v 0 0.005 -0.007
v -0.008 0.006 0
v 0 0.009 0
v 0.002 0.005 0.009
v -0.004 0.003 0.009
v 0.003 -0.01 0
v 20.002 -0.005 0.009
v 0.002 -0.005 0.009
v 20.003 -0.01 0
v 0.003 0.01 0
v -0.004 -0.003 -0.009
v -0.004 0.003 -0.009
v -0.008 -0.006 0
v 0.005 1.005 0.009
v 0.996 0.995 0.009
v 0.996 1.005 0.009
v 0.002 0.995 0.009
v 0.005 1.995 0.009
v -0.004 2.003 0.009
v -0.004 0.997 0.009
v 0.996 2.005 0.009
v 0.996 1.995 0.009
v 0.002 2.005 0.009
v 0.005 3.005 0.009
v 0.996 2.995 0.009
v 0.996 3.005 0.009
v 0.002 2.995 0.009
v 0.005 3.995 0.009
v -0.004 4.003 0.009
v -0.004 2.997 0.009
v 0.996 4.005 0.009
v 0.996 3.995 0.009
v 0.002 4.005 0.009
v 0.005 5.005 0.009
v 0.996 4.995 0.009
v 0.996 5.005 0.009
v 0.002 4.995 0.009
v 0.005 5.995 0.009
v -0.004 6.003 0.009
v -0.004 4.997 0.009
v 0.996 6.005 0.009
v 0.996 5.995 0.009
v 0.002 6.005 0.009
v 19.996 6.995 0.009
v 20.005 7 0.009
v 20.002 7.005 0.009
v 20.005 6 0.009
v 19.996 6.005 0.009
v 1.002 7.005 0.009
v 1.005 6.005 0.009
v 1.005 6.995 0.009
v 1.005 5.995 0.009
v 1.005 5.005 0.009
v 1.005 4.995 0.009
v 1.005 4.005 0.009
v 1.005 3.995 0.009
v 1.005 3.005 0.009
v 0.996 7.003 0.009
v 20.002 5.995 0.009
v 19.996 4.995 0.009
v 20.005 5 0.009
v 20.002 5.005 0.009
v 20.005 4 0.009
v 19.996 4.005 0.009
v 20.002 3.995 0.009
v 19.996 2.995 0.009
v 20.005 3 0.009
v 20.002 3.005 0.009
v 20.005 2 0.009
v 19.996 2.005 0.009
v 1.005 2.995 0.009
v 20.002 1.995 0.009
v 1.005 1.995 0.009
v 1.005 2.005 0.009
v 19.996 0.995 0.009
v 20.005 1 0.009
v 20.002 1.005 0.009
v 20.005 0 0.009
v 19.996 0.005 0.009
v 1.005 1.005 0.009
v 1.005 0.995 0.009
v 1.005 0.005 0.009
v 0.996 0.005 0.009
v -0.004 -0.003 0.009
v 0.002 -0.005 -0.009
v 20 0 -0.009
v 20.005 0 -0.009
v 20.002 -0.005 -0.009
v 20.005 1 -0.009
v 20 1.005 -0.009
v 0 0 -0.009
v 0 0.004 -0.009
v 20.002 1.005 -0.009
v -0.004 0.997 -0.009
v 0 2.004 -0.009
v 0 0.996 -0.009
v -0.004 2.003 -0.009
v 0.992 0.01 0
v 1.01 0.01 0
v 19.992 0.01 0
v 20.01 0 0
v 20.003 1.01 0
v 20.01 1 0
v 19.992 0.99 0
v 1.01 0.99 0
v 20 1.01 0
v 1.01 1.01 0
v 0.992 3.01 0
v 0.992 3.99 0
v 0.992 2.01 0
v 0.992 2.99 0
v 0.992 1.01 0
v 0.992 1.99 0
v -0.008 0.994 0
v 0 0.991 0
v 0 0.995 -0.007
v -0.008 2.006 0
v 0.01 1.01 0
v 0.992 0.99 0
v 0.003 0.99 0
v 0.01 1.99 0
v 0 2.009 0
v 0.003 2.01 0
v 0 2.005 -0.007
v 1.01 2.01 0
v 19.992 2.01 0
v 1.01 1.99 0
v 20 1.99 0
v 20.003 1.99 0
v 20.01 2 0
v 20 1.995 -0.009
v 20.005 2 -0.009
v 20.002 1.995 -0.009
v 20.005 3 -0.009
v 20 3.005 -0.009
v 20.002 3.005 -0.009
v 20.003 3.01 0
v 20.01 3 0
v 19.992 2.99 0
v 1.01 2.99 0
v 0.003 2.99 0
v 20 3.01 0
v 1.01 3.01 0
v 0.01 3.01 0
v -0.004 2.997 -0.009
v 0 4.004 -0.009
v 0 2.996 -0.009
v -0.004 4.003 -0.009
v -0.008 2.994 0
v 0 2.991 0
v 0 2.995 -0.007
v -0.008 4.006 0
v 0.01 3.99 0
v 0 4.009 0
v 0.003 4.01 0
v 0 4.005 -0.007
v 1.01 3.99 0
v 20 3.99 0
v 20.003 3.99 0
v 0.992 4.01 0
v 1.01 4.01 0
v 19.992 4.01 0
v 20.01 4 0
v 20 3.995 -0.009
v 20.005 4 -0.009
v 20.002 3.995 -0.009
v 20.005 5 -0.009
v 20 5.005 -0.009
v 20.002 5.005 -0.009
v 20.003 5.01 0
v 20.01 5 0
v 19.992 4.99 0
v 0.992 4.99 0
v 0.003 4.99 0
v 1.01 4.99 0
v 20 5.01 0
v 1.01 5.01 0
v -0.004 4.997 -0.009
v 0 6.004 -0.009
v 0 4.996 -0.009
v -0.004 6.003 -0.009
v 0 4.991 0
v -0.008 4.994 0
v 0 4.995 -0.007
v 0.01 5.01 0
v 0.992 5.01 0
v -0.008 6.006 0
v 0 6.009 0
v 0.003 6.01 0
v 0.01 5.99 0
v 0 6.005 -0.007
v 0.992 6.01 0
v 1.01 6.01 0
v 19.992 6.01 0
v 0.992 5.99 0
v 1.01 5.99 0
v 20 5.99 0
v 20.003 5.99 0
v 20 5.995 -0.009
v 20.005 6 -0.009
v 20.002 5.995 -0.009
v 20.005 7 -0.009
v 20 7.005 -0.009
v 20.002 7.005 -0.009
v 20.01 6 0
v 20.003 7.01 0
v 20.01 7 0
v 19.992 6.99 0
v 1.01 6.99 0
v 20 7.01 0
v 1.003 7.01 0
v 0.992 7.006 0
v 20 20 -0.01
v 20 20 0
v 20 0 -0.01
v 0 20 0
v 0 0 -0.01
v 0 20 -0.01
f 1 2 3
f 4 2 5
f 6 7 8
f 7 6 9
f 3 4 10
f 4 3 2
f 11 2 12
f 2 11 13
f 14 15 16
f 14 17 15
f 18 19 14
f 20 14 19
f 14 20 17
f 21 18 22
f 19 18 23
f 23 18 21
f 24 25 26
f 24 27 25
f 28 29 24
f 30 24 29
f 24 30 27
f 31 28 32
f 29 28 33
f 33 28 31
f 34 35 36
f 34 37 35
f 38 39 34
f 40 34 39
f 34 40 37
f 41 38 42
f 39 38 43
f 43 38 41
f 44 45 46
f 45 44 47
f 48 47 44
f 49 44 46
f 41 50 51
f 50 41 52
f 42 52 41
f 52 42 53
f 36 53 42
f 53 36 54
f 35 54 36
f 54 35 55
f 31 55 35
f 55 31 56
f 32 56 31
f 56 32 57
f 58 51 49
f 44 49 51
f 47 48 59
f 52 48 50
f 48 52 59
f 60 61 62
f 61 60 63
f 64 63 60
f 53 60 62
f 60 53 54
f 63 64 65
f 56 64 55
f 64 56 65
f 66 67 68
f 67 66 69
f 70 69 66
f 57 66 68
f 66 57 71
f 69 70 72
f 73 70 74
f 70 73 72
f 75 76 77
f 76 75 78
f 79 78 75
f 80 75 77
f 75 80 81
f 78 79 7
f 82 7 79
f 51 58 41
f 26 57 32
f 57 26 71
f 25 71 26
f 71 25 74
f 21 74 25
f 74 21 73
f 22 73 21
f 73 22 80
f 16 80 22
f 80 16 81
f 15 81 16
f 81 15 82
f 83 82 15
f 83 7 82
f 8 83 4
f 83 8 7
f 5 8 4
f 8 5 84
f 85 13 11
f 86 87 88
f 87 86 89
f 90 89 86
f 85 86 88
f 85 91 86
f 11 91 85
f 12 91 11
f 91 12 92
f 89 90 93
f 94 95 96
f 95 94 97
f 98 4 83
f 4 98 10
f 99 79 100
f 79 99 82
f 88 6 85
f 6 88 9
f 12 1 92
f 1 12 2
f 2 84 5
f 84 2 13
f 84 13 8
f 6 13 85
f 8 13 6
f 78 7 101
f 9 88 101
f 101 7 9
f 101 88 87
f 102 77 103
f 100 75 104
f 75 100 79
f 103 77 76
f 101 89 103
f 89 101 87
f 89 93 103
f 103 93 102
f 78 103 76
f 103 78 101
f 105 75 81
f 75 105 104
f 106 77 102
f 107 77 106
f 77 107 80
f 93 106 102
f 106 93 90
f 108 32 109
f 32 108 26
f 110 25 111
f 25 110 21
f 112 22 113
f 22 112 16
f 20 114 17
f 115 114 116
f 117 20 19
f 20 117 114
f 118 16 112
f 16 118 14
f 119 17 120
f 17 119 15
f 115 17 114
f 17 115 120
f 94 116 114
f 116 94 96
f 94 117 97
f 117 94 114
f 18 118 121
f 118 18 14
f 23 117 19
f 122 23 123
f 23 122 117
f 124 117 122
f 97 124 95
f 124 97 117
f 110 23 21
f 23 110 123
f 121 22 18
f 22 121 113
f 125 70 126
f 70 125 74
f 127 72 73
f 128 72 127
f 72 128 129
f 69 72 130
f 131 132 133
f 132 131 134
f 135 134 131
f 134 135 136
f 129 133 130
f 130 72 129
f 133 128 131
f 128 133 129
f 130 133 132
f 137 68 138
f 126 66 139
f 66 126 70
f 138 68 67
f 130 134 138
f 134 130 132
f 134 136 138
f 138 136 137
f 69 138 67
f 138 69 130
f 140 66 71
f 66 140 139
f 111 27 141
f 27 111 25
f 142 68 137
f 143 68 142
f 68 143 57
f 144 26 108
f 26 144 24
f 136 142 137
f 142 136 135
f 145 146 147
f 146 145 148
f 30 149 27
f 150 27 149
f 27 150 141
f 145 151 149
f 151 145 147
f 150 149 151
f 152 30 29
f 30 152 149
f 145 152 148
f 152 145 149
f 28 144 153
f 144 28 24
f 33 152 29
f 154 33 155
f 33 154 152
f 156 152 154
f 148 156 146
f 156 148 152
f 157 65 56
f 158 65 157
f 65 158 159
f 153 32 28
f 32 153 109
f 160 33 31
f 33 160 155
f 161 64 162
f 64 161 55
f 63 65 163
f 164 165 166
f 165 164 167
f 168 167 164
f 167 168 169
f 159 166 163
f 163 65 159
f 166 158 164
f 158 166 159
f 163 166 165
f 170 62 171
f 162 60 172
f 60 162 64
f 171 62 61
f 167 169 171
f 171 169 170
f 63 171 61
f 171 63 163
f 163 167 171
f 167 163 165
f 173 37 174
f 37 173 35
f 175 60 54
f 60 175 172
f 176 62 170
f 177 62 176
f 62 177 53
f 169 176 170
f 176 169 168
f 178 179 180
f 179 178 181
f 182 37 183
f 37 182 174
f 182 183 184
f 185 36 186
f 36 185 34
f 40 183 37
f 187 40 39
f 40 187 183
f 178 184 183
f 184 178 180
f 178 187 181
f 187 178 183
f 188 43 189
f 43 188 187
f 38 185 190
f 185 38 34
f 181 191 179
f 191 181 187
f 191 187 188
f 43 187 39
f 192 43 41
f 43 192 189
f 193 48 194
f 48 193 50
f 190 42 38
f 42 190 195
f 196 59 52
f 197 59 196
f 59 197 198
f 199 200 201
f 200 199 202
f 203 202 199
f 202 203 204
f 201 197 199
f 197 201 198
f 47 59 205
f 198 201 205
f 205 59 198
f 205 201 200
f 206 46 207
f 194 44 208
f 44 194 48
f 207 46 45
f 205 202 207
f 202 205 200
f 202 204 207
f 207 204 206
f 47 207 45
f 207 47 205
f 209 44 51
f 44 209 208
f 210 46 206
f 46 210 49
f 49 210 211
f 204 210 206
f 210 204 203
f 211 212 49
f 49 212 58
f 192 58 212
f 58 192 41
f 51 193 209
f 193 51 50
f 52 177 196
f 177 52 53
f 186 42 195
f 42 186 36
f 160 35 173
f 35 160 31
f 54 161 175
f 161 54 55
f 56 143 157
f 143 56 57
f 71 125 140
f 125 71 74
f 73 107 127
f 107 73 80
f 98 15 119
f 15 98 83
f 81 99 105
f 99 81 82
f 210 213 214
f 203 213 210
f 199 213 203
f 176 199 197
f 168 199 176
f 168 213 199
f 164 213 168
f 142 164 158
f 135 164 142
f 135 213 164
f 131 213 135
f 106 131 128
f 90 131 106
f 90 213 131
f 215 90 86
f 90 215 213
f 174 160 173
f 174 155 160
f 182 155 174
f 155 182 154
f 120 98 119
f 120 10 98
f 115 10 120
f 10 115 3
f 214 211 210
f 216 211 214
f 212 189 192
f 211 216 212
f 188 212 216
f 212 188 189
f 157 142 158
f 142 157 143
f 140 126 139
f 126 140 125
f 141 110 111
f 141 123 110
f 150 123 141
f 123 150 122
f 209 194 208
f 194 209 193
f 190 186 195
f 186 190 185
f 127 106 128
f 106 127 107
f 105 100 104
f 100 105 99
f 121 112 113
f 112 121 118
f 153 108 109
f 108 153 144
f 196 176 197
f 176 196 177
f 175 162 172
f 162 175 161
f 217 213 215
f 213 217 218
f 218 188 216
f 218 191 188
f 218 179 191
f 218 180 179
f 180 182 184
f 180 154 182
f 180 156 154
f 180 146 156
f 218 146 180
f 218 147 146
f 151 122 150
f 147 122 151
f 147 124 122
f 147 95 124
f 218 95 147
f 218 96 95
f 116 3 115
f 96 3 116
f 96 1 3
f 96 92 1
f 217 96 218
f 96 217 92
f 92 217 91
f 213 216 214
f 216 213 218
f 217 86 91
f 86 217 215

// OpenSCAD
hull(){
    translate([0.0, 0.0]) sphere(0.01);
    translate([1.0, 0.0]) sphere(0.01);
}
hull(){
    translate([1.0, 0.0]) sphere(0.01);
    translate([2.0, 0.0]) sphere(0.01);
}
hull(){
    translate([2.0, 0.0]) sphere(0.01);
    translate([3.0, 0.0]) sphere(0.01);
}
hull(){
    translate([3.0, 0.0]) sphere(0.01);
    translate([4.0, 0.0]) sphere(0.01);
}
hull(){
    translate([4.0, 0.0]) sphere(0.01);
    translate([5.0, 0.0]) sphere(0.01);
}
hull(){
    translate([5.0, 0.0]) sphere(0.01);
    translate([6.0, 0.0]) sphere(0.01);
}
hull(){
    translate([6.0, 0.0]) sphere(0.01);
    translate([7.0, 0.0]) sphere(0.01);
}
hull(){
    translate([7.0, 0.0]) sphere(0.01);
    translate([8.0, 0.0]) sphere(0.01);
}
hull(){
    translate([8.0, 0.0]) sphere(0.01);
    translate([9.0, 0.0]) sphere(0.01);
}
hull(){
    translate([9.0, 0.0]) sphere(0.01);
    translate([10.0, 0.0]) sphere(0.01);
}
hull(){
    translate([10.0, 0.0]) sphere(0.01);
    translate([11.0, 0.0]) sphere(0.01);
}
hull(){
    translate([11.0, 0.0]) sphere(0.01);
    translate([12.0, 0.0]) sphere(0.01);
}
hull(){
    translate([12.0, 0.0]) sphere(0.01);
    translate([13.0, 0.0]) sphere(0.01);
}
hull(){
    translate([13.0, 0.0]) sphere(0.01);
    translate([14.0, 0.0]) sphere(0.01);
}
hull(){
    translate([14.0, 0.0]) sphere(0.01);
    translate([15.0, 0.0]) sphere(0.01);
}
hull(){
    translate([15.0, 0.0]) sphere(0.01);
    translate([16.0, 0.0]) sphere(0.01);
}
hull(){
    translate([16.0, 0.0]) sphere(0.01);
    translate([17.0, 0.0]) sphere(0.01);
}
hull(){
    translate([17.0, 0.0]) sphere(0.01);
    translate([18.0, 0.0]) sphere(0.01);
}
hull(){
    translate([18.0, 0.0]) sphere(0.01);
    translate([19.0, 0.0]) sphere(0.01);
}
hull(){
    translate([19.0, 0.0]) sphere(0.01);
    translate([20.0, 0.0]) sphere(0.01);
}
hull(){
    translate([20.0, 0.0]) sphere(0.01);
    translate([20.0, 1.0]) sphere(0.01);
}
hull(){
    translate([20.0, 1.0]) sphere(0.01);
    translate([19.0, 1.0]) sphere(0.01);
}
hull(){
    translate([19.0, 1.0]) sphere(0.01);
    translate([18.0, 1.0]) sphere(0.01);
}
hull(){
    translate([18.0, 1.0]) sphere(0.01);
    translate([17.0, 1.0]) sphere(0.01);
}
hull(){
    translate([17.0, 1.0]) sphere(0.01);
    translate([16.0, 1.0]) sphere(0.01);
}
hull(){
    translate([16.0, 1.0]) sphere(0.01);
    translate([15.0, 1.0]) sphere(0.01);
}
hull(){
    translate([15.0, 1.0]) sphere(0.01);
    translate([14.0, 1.0]) sphere(0.01);
}
hull(){
    translate([14.0, 1.0]) sphere(0.01);
    translate([13.0, 1.0]) sphere(0.01);
}
hull(){
    translate([13.0, 1.0]) sphere(0.01);
    translate([12.0, 1.0]) sphere(0.01);
}
hull(){
    translate([12.0, 1.0]) sphere(0.01);
    translate([11.0, 1.0]) sphere(0.01);
}
hull(){
    translate([11.0, 1.0]) sphere(0.01);
    translate([10.0, 1.0]) sphere(0.01);
}
hull(){
    translate([10.0, 1.0]) sphere(0.01);
    translate([9.0, 1.0]) sphere(0.01);
}
hull(){
    translate([9.0, 1.0]) sphere(0.01);
    translate([8.0, 1.0]) sphere(0.01);
}
hull(){
    translate([8.0, 1.0]) sphere(0.01);
    translate([7.0, 1.0]) sphere(0.01);
}
hull(){
    translate([7.0, 1.0]) sphere(0.01);
    translate([6.0, 1.0]) sphere(0.01);
}
hull(){
    translate([6.0, 1.0]) sphere(0.01);
    translate([5.0, 1.0]) sphere(0.01);
}
hull(){
    translate([5.0, 1.0]) sphere(0.01);
    translate([4.0, 1.0]) sphere(0.01);
}
hull(){
    translate([4.0, 1.0]) sphere(0.01);
    translate([3.0, 1.0]) sphere(0.01);
}
hull(){
    translate([3.0, 1.0]) sphere(0.01);
    translate([2.0, 1.0]) sphere(0.01);
}
hull(){
    translate([2.0, 1.0]) sphere(0.01);
    translate([1.0, 1.0]) sphere(0.01);
}
hull(){
    translate([1.0, 1.0]) sphere(0.01);
    translate([0.0, 1.0]) sphere(0.01);
}
hull(){
    translate([0.0, 1.0]) sphere(0.01);
    translate([0.0, 2.0]) sphere(0.01);
}
hull(){
    translate([0.0, 2.0]) sphere(0.01);
    translate([1.0, 2.0]) sphere(0.01);
}
hull(){
    translate([1.0, 2.0]) sphere(0.01);
    translate([2.0, 2.0]) sphere(0.01);
}
hull(){
    translate([2.0, 2.0]) sphere(0.01);
    translate([3.0, 2.0]) sphere(0.01);
}
hull(){
    translate([3.0, 2.0]) sphere(0.01);
    translate([4.0, 2.0]) sphere(0.01);
}
hull(){
    translate([4.0, 2.0]) sphere(0.01);
    translate([5.0, 2.0]) sphere(0.01);
}
hull(){
    translate([5.0, 2.0]) sphere(0.01);
    translate([6.0, 2.0]) sphere(0.01);
}
hull(){
    translate([6.0, 2.0]) sphere(0.01);
    translate([7.0, 2.0]) sphere(0.01);
}
hull(){
    translate([7.0, 2.0]) sphere(0.01);
    translate([8.0, 2.0]) sphere(0.01);
}
hull(){
    translate([8.0, 2.0]) sphere(0.01);
    translate([9.0, 2.0]) sphere(0.01);
}
hull(){
    translate([9.0, 2.0]) sphere(0.01);
    translate([10.0, 2.0]) sphere(0.01);
}
hull(){
    translate([10.0, 2.0]) sphere(0.01);
    translate([11.0, 2.0]) sphere(0.01);
}
hull(){
    translate([11.0, 2.0]) sphere(0.01);
    translate([12.0, 2.0]) sphere(0.01);
}
hull(){
    translate([12.0, 2.0]) sphere(0.01);
    translate([13.0, 2.0]) sphere(0.01);
}
hull(){
    translate([13.0, 2.0]) sphere(0.01);
    translate([14.0, 2.0]) sphere(0.01);
}
hull(){
    translate([14.0, 2.0]) sphere(0.01);
    translate([15.0, 2.0]) sphere(0.01);
}
hull(){
    translate([15.0, 2.0]) sphere(0.01);
    translate([16.0, 2.0]) sphere(0.01);
}
hull(){
    translate([16.0, 2.0]) sphere(0.01);
    translate([17.0, 2.0]) sphere(0.01);
}
hull(){
    translate([17.0, 2.0]) sphere(0.01);
    translate([18.0, 2.0]) sphere(0.01);
}
hull(){
    translate([18.0, 2.0]) sphere(0.01);
    translate([19.0, 2.0]) sphere(0.01);
}
hull(){
    translate([19.0, 2.0]) sphere(0.01);
    translate([20.0, 2.0]) sphere(0.01);
}
hull(){
    translate([20.0, 2.0]) sphere(0.01);
    translate([20.0, 3.0]) sphere(0.01);
}
hull(){
    translate([20.0, 3.0]) sphere(0.01);
    translate([19.0, 3.0]) sphere(0.01);
}
hull(){
    translate([19.0, 3.0]) sphere(0.01);
    translate([18.0, 3.0]) sphere(0.01);
}
hull(){
    translate([18.0, 3.0]) sphere(0.01);
    translate([17.0, 3.0]) sphere(0.01);
}
hull(){
    translate([17.0, 3.0]) sphere(0.01);
    translate([16.0, 3.0]) sphere(0.01);
}
hull(){
    translate([16.0, 3.0]) sphere(0.01);
    translate([15.0, 3.0]) sphere(0.01);
}
hull(){
    translate([15.0, 3.0]) sphere(0.01);
    translate([14.0, 3.0]) sphere(0.01);
}
hull(){
    translate([14.0, 3.0]) sphere(0.01);
    translate([13.0, 3.0]) sphere(0.01);
}
hull(){
    translate([13.0, 3.0]) sphere(0.01);
    translate([12.0, 3.0]) sphere(0.01);
}
hull(){
    translate([12.0, 3.0]) sphere(0.01);
    translate([11.0, 3.0]) sphere(0.01);
}
hull(){
    translate([11.0, 3.0]) sphere(0.01);
    translate([10.0, 3.0]) sphere(0.01);
}
hull(){
    translate([10.0, 3.0]) sphere(0.01);
    translate([9.0, 3.0]) sphere(0.01);
}
hull(){
    translate([9.0, 3.0]) sphere(0.01);
    translate([8.0, 3.0]) sphere(0.01);
}
hull(){
    translate([8.0, 3.0]) sphere(0.01);
    translate([7.0, 3.0]) sphere(0.01);
}
hull(){
    translate([7.0, 3.0]) sphere(0.01);
    translate([6.0, 3.0]) sphere(0.01);
}
hull(){
    translate([6.0, 3.0]) sphere(0.01);
    translate([5.0, 3.0]) sphere(0.01);
}
hull(){
    translate([5.0, 3.0]) sphere(0.01);
    translate([4.0, 3.0]) sphere(0.01);
}
hull(){
    translate([4.0, 3.0]) sphere(0.01);
    translate([3.0, 3.0]) sphere(0.01);
}
hull(){
    translate([3.0, 3.0]) sphere(0.01);
    translate([2.0, 3.0]) sphere(0.01);
}
hull(){
    translate([2.0, 3.0]) sphere(0.01);
    translate([1.0, 3.0]) sphere(0.01);
}
hull(){
    translate([1.0, 3.0]) sphere(0.01);
    translate([0.0, 3.0]) sphere(0.01);
}
hull(){
    translate([0.0, 3.0]) sphere(0.01);
    translate([0.0, 4.0]) sphere(0.01);
}
hull(){
    translate([0.0, 4.0]) sphere(0.01);
    translate([1.0, 4.0]) sphere(0.01);
}
hull(){
    translate([1.0, 4.0]) sphere(0.01);
    translate([2.0, 4.0]) sphere(0.01);
}
hull(){
    translate([2.0, 4.0]) sphere(0.01);
    translate([3.0, 4.0]) sphere(0.01);
}
hull(){
    translate([3.0, 4.0]) sphere(0.01);
    translate([4.0, 4.0]) sphere(0.01);
}
hull(){
    translate([4.0, 4.0]) sphere(0.01);
    translate([5.0, 4.0]) sphere(0.01);
}
hull(){
    translate([5.0, 4.0]) sphere(0.01);
    translate([6.0, 4.0]) sphere(0.01);
}
hull(){
    translate([6.0, 4.0]) sphere(0.01);
    translate([7.0, 4.0]) sphere(0.01);
}
hull(){
    translate([7.0, 4.0]) sphere(0.01);
    translate([8.0, 4.0]) sphere(0.01);
}
hull(){
    translate([8.0, 4.0]) sphere(0.01);
    translate([9.0, 4.0]) sphere(0.01);
}
hull(){
    translate([9.0, 4.0]) sphere(0.01);
    translate([10.0, 4.0]) sphere(0.01);
}
hull(){
    translate([10.0, 4.0]) sphere(0.01);
    translate([11.0, 4.0]) sphere(0.01);
}
hull(){
    translate([11.0, 4.0]) sphere(0.01);
    translate([12.0, 4.0]) sphere(0.01);
}
hull(){
    translate([12.0, 4.0]) sphere(0.01);
    translate([13.0, 4.0]) sphere(0.01);
}
hull(){
    translate([13.0, 4.0]) sphere(0.01);
    translate([14.0, 4.0]) sphere(0.01);
}
hull(){
    translate([14.0, 4.0]) sphere(0.01);
    translate([15.0, 4.0]) sphere(0.01);
}
hull(){
    translate([15.0, 4.0]) sphere(0.01);
    translate([16.0, 4.0]) sphere(0.01);
}
hull(){
    translate([16.0, 4.0]) sphere(0.01);
    translate([17.0, 4.0]) sphere(0.01);
}
hull(){
    translate([17.0, 4.0]) sphere(0.01);
    translate([18.0, 4.0]) sphere(0.01);
}
hull(){
    translate([18.0, 4.0]) sphere(0.01);
    translate([19.0, 4.0]) sphere(0.01);
}
hull(){
    translate([19.0, 4.0]) sphere(0.01);
    translate([20.0, 4.0]) sphere(0.01);
}
hull(){
    translate([20.0, 4.0]) sphere(0.01);
    translate([20.0, 5.0]) sphere(0.01);
}
hull(){
    translate([20.0, 5.0]) sphere(0.01);
    translate([19.0, 5.0]) sphere(0.01);
}
hull(){
    translate([19.0, 5.0]) sphere(0.01);
    translate([18.0, 5.0]) sphere(0.01);
}
hull(){
    translate([18.0, 5.0]) sphere(0.01);
    translate([17.0, 5.0]) sphere(0.01);
}
hull(){
    translate([17.0, 5.0]) sphere(0.01);
    translate([16.0, 5.0]) sphere(0.01);
}
hull(){
    translate([16.0, 5.0]) sphere(0.01);
    translate([15.0, 5.0]) sphere(0.01);
}
hull(){
    translate([15.0, 5.0]) sphere(0.01);
    translate([14.0, 5.0]) sphere(0.01);
}
hull(){
    translate([14.0, 5.0]) sphere(0.01);
    translate([13.0, 5.0]) sphere(0.01);
}
hull(){
    translate([13.0, 5.0]) sphere(0.01);
    translate([12.0, 5.0]) sphere(0.01);
}
hull(){
    translate([12.0, 5.0]) sphere(0.01);
    translate([11.0, 5.0]) sphere(0.01);
}
hull(){
    translate([11.0, 5.0]) sphere(0.01);
    translate([10.0, 5.0]) sphere(0.01);
}
hull(){
    translate([10.0, 5.0]) sphere(0.01);
    translate([9.0, 5.0]) sphere(0.01);
}
hull(){
    translate([9.0, 5.0]) sphere(0.01);
    translate([8.0, 5.0]) sphere(0.01);
}
hull(){
    translate([8.0, 5.0]) sphere(0.01);
    translate([7.0, 5.0]) sphere(0.01);
}
hull(){
    translate([7.0, 5.0]) sphere(0.01);
    translate([6.0, 5.0]) sphere(0.01);
}
hull(){
    translate([6.0, 5.0]) sphere(0.01);
    translate([5.0, 5.0]) sphere(0.01);
}
hull(){
    translate([5.0, 5.0]) sphere(0.01);
    translate([4.0, 5.0]) sphere(0.01);
}
hull(){
    translate([4.0, 5.0]) sphere(0.01);
    translate([3.0, 5.0]) sphere(0.01);
}
hull(){
    translate([3.0, 5.0]) sphere(0.01);
    translate([2.0, 5.0]) sphere(0.01);
}
hull(){
    translate([2.0, 5.0]) sphere(0.01);
    translate([1.0, 5.0]) sphere(0.01);
}
hull(){
    translate([1.0, 5.0]) sphere(0.01);
    translate([0.0, 5.0]) sphere(0.01);
}
hull(){
    translate([0.0, 5.0]) sphere(0.01);
    translate([0.0, 6.0]) sphere(0.01);
}
hull(){
    translate([0.0, 6.0]) sphere(0.01);
    translate([1.0, 6.0]) sphere(0.01);
}
hull(){
    translate([1.0, 6.0]) sphere(0.01);
    translate([2.0, 6.0]) sphere(0.01);
}
hull(){
    translate([2.0, 6.0]) sphere(0.01);
    translate([3.0, 6.0]) sphere(0.01);
}
hull(){
    translate([3.0, 6.0]) sphere(0.01);
    translate([4.0, 6.0]) sphere(0.01);
}
hull(){
    translate([4.0, 6.0]) sphere(0.01);
    translate([5.0, 6.0]) sphere(0.01);
}
hull(){
    translate([5.0, 6.0]) sphere(0.01);
    translate([6.0, 6.0]) sphere(0.01);
}
hull(){
    translate([6.0, 6.0]) sphere(0.01);
    translate([7.0, 6.0]) sphere(0.01);
}
hull(){
    translate([7.0, 6.0]) sphere(0.01);
    translate([8.0, 6.0]) sphere(0.01);
}
hull(){
    translate([8.0, 6.0]) sphere(0.01);
    translate([9.0, 6.0]) sphere(0.01);
}
hull(){
    translate([9.0, 6.0]) sphere(0.01);
    translate([10.0, 6.0]) sphere(0.01);
}
hull(){
    translate([10.0, 6.0]) sphere(0.01);
    translate([11.0, 6.0]) sphere(0.01);
}
hull(){
    translate([11.0, 6.0]) sphere(0.01);
    translate([12.0, 6.0]) sphere(0.01);
}
hull(){
    translate([12.0, 6.0]) sphere(0.01);
    translate([13.0, 6.0]) sphere(0.01);
}
hull(){
    translate([13.0, 6.0]) sphere(0.01);
    translate([14.0, 6.0]) sphere(0.01);
}
hull(){
    translate([14.0, 6.0]) sphere(0.01);
    translate([15.0, 6.0]) sphere(0.01);
}
hull(){
    translate([15.0, 6.0]) sphere(0.01);
    translate([16.0, 6.0]) sphere(0.01);
}
hull(){
    translate([16.0, 6.0]) sphere(0.01);
    translate([17.0, 6.0]) sphere(0.01);
}
hull(){
    translate([17.0, 6.0]) sphere(0.01);
    translate([18.0, 6.0]) sphere(0.01);
}
hull(){
    translate([18.0, 6.0]) sphere(0.01);
    translate([19.0, 6.0]) sphere(0.01);
}
hull(){
    translate([19.0, 6.0]) sphere(0.01);
    translate([20.0, 6.0]) sphere(0.01);
}
hull(){
    translate([20.0, 6.0]) sphere(0.01);
    translate([20.0, 7.0]) sphere(0.01);
}
hull(){
    translate([20.0, 7.0]) sphere(0.01);
    translate([19.0, 7.0]) sphere(0.01);
}
hull(){
    translate([19.0, 7.0]) sphere(0.01);
    translate([18.0, 7.0]) sphere(0.01);
}
hull(){
    translate([18.0, 7.0]) sphere(0.01);
    translate([17.0, 7.0]) sphere(0.01);
}
hull(){
    translate([17.0, 7.0]) sphere(0.01);
    translate([16.0, 7.0]) sphere(0.01);
}
hull(){
    translate([16.0, 7.0]) sphere(0.01);
    translate([15.0, 7.0]) sphere(0.01);
}
hull(){
    translate([15.0, 7.0]) sphere(0.01);
    translate([14.0, 7.0]) sphere(0.01);
}
hull(){
    translate([14.0, 7.0]) sphere(0.01);
    translate([13.0, 7.0]) sphere(0.01);
}
hull(){
    translate([13.0, 7.0]) sphere(0.01);
    translate([12.0, 7.0]) sphere(0.01);
}
hull(){
    translate([12.0, 7.0]) sphere(0.01);
    translate([11.0, 7.0]) sphere(0.01);
}
hull(){
    translate([11.0, 7.0]) sphere(0.01);
    translate([10.0, 7.0]) sphere(0.01);
}
hull(){
    translate([10.0, 7.0]) sphere(0.01);
    translate([9.0, 7.0]) sphere(0.01);
}
hull(){
    translate([9.0, 7.0]) sphere(0.01);
    translate([8.0, 7.0]) sphere(0.01);
}
hull(){
    translate([8.0, 7.0]) sphere(0.01);
    translate([7.0, 7.0]) sphere(0.01);
}
hull(){
    translate([7.0, 7.0]) sphere(0.01);
    translate([6.0, 7.0]) sphere(0.01);
}
hull(){
    translate([6.0, 7.0]) sphere(0.01);
    translate([5.0, 7.0]) sphere(0.01);
}
hull(){
    translate([5.0, 7.0]) sphere(0.01);
    translate([4.0, 7.0]) sphere(0.01);
}
hull(){
    translate([4.0, 7.0]) sphere(0.01);
    translate([3.0, 7.0]) sphere(0.01);
}
hull(){
    translate([3.0, 7.0]) sphere(0.01);
    translate([2.0, 7.0]) sphere(0.01);
}
hull(){
    translate([2.0, 7.0]) sphere(0.01);
    translate([1.0, 7.0]) sphere(0.01);
}
hull(){
    translate([1.0, 7.0]) sphere(0.01);
    translate([1.0, 6.0]) sphere(0.01);
}
hull(){
    translate([1.0, 6.0]) sphere(0.01);
    translate([1.0, 5.0]) sphere(0.01);
}
hull(){
    translate([1.0, 5.0]) sphere(0.01);
    translate([1.0, 4.0]) sphere(0.01);
}
hull(){
    translate([1.0, 4.0]) sphere(0.01);
    translate([1.0, 3.0]) sphere(0.01);
}
hull(){
    translate([1.0, 3.0]) sphere(0.01);
    translate([1.0, 2.0]) sphere(0.01);
}
hull(){
    translate([1.0, 2.0]) sphere(0.01);
    translate([1.0, 1.0]) sphere(0.01);
}
hull(){
    translate([1.0, 1.0]) sphere(0.01);
    translate([1.0, 0.0]) sphere(0.01);
}
hull(){
    translate([1.0, 0.0]) sphere(0.01);
    translate([0.0, 0.0]) sphere(0.01);
}
translate([0,0,-0.01]) color([0.1,0.1,0.1]) cube([20,20,0.01]);
